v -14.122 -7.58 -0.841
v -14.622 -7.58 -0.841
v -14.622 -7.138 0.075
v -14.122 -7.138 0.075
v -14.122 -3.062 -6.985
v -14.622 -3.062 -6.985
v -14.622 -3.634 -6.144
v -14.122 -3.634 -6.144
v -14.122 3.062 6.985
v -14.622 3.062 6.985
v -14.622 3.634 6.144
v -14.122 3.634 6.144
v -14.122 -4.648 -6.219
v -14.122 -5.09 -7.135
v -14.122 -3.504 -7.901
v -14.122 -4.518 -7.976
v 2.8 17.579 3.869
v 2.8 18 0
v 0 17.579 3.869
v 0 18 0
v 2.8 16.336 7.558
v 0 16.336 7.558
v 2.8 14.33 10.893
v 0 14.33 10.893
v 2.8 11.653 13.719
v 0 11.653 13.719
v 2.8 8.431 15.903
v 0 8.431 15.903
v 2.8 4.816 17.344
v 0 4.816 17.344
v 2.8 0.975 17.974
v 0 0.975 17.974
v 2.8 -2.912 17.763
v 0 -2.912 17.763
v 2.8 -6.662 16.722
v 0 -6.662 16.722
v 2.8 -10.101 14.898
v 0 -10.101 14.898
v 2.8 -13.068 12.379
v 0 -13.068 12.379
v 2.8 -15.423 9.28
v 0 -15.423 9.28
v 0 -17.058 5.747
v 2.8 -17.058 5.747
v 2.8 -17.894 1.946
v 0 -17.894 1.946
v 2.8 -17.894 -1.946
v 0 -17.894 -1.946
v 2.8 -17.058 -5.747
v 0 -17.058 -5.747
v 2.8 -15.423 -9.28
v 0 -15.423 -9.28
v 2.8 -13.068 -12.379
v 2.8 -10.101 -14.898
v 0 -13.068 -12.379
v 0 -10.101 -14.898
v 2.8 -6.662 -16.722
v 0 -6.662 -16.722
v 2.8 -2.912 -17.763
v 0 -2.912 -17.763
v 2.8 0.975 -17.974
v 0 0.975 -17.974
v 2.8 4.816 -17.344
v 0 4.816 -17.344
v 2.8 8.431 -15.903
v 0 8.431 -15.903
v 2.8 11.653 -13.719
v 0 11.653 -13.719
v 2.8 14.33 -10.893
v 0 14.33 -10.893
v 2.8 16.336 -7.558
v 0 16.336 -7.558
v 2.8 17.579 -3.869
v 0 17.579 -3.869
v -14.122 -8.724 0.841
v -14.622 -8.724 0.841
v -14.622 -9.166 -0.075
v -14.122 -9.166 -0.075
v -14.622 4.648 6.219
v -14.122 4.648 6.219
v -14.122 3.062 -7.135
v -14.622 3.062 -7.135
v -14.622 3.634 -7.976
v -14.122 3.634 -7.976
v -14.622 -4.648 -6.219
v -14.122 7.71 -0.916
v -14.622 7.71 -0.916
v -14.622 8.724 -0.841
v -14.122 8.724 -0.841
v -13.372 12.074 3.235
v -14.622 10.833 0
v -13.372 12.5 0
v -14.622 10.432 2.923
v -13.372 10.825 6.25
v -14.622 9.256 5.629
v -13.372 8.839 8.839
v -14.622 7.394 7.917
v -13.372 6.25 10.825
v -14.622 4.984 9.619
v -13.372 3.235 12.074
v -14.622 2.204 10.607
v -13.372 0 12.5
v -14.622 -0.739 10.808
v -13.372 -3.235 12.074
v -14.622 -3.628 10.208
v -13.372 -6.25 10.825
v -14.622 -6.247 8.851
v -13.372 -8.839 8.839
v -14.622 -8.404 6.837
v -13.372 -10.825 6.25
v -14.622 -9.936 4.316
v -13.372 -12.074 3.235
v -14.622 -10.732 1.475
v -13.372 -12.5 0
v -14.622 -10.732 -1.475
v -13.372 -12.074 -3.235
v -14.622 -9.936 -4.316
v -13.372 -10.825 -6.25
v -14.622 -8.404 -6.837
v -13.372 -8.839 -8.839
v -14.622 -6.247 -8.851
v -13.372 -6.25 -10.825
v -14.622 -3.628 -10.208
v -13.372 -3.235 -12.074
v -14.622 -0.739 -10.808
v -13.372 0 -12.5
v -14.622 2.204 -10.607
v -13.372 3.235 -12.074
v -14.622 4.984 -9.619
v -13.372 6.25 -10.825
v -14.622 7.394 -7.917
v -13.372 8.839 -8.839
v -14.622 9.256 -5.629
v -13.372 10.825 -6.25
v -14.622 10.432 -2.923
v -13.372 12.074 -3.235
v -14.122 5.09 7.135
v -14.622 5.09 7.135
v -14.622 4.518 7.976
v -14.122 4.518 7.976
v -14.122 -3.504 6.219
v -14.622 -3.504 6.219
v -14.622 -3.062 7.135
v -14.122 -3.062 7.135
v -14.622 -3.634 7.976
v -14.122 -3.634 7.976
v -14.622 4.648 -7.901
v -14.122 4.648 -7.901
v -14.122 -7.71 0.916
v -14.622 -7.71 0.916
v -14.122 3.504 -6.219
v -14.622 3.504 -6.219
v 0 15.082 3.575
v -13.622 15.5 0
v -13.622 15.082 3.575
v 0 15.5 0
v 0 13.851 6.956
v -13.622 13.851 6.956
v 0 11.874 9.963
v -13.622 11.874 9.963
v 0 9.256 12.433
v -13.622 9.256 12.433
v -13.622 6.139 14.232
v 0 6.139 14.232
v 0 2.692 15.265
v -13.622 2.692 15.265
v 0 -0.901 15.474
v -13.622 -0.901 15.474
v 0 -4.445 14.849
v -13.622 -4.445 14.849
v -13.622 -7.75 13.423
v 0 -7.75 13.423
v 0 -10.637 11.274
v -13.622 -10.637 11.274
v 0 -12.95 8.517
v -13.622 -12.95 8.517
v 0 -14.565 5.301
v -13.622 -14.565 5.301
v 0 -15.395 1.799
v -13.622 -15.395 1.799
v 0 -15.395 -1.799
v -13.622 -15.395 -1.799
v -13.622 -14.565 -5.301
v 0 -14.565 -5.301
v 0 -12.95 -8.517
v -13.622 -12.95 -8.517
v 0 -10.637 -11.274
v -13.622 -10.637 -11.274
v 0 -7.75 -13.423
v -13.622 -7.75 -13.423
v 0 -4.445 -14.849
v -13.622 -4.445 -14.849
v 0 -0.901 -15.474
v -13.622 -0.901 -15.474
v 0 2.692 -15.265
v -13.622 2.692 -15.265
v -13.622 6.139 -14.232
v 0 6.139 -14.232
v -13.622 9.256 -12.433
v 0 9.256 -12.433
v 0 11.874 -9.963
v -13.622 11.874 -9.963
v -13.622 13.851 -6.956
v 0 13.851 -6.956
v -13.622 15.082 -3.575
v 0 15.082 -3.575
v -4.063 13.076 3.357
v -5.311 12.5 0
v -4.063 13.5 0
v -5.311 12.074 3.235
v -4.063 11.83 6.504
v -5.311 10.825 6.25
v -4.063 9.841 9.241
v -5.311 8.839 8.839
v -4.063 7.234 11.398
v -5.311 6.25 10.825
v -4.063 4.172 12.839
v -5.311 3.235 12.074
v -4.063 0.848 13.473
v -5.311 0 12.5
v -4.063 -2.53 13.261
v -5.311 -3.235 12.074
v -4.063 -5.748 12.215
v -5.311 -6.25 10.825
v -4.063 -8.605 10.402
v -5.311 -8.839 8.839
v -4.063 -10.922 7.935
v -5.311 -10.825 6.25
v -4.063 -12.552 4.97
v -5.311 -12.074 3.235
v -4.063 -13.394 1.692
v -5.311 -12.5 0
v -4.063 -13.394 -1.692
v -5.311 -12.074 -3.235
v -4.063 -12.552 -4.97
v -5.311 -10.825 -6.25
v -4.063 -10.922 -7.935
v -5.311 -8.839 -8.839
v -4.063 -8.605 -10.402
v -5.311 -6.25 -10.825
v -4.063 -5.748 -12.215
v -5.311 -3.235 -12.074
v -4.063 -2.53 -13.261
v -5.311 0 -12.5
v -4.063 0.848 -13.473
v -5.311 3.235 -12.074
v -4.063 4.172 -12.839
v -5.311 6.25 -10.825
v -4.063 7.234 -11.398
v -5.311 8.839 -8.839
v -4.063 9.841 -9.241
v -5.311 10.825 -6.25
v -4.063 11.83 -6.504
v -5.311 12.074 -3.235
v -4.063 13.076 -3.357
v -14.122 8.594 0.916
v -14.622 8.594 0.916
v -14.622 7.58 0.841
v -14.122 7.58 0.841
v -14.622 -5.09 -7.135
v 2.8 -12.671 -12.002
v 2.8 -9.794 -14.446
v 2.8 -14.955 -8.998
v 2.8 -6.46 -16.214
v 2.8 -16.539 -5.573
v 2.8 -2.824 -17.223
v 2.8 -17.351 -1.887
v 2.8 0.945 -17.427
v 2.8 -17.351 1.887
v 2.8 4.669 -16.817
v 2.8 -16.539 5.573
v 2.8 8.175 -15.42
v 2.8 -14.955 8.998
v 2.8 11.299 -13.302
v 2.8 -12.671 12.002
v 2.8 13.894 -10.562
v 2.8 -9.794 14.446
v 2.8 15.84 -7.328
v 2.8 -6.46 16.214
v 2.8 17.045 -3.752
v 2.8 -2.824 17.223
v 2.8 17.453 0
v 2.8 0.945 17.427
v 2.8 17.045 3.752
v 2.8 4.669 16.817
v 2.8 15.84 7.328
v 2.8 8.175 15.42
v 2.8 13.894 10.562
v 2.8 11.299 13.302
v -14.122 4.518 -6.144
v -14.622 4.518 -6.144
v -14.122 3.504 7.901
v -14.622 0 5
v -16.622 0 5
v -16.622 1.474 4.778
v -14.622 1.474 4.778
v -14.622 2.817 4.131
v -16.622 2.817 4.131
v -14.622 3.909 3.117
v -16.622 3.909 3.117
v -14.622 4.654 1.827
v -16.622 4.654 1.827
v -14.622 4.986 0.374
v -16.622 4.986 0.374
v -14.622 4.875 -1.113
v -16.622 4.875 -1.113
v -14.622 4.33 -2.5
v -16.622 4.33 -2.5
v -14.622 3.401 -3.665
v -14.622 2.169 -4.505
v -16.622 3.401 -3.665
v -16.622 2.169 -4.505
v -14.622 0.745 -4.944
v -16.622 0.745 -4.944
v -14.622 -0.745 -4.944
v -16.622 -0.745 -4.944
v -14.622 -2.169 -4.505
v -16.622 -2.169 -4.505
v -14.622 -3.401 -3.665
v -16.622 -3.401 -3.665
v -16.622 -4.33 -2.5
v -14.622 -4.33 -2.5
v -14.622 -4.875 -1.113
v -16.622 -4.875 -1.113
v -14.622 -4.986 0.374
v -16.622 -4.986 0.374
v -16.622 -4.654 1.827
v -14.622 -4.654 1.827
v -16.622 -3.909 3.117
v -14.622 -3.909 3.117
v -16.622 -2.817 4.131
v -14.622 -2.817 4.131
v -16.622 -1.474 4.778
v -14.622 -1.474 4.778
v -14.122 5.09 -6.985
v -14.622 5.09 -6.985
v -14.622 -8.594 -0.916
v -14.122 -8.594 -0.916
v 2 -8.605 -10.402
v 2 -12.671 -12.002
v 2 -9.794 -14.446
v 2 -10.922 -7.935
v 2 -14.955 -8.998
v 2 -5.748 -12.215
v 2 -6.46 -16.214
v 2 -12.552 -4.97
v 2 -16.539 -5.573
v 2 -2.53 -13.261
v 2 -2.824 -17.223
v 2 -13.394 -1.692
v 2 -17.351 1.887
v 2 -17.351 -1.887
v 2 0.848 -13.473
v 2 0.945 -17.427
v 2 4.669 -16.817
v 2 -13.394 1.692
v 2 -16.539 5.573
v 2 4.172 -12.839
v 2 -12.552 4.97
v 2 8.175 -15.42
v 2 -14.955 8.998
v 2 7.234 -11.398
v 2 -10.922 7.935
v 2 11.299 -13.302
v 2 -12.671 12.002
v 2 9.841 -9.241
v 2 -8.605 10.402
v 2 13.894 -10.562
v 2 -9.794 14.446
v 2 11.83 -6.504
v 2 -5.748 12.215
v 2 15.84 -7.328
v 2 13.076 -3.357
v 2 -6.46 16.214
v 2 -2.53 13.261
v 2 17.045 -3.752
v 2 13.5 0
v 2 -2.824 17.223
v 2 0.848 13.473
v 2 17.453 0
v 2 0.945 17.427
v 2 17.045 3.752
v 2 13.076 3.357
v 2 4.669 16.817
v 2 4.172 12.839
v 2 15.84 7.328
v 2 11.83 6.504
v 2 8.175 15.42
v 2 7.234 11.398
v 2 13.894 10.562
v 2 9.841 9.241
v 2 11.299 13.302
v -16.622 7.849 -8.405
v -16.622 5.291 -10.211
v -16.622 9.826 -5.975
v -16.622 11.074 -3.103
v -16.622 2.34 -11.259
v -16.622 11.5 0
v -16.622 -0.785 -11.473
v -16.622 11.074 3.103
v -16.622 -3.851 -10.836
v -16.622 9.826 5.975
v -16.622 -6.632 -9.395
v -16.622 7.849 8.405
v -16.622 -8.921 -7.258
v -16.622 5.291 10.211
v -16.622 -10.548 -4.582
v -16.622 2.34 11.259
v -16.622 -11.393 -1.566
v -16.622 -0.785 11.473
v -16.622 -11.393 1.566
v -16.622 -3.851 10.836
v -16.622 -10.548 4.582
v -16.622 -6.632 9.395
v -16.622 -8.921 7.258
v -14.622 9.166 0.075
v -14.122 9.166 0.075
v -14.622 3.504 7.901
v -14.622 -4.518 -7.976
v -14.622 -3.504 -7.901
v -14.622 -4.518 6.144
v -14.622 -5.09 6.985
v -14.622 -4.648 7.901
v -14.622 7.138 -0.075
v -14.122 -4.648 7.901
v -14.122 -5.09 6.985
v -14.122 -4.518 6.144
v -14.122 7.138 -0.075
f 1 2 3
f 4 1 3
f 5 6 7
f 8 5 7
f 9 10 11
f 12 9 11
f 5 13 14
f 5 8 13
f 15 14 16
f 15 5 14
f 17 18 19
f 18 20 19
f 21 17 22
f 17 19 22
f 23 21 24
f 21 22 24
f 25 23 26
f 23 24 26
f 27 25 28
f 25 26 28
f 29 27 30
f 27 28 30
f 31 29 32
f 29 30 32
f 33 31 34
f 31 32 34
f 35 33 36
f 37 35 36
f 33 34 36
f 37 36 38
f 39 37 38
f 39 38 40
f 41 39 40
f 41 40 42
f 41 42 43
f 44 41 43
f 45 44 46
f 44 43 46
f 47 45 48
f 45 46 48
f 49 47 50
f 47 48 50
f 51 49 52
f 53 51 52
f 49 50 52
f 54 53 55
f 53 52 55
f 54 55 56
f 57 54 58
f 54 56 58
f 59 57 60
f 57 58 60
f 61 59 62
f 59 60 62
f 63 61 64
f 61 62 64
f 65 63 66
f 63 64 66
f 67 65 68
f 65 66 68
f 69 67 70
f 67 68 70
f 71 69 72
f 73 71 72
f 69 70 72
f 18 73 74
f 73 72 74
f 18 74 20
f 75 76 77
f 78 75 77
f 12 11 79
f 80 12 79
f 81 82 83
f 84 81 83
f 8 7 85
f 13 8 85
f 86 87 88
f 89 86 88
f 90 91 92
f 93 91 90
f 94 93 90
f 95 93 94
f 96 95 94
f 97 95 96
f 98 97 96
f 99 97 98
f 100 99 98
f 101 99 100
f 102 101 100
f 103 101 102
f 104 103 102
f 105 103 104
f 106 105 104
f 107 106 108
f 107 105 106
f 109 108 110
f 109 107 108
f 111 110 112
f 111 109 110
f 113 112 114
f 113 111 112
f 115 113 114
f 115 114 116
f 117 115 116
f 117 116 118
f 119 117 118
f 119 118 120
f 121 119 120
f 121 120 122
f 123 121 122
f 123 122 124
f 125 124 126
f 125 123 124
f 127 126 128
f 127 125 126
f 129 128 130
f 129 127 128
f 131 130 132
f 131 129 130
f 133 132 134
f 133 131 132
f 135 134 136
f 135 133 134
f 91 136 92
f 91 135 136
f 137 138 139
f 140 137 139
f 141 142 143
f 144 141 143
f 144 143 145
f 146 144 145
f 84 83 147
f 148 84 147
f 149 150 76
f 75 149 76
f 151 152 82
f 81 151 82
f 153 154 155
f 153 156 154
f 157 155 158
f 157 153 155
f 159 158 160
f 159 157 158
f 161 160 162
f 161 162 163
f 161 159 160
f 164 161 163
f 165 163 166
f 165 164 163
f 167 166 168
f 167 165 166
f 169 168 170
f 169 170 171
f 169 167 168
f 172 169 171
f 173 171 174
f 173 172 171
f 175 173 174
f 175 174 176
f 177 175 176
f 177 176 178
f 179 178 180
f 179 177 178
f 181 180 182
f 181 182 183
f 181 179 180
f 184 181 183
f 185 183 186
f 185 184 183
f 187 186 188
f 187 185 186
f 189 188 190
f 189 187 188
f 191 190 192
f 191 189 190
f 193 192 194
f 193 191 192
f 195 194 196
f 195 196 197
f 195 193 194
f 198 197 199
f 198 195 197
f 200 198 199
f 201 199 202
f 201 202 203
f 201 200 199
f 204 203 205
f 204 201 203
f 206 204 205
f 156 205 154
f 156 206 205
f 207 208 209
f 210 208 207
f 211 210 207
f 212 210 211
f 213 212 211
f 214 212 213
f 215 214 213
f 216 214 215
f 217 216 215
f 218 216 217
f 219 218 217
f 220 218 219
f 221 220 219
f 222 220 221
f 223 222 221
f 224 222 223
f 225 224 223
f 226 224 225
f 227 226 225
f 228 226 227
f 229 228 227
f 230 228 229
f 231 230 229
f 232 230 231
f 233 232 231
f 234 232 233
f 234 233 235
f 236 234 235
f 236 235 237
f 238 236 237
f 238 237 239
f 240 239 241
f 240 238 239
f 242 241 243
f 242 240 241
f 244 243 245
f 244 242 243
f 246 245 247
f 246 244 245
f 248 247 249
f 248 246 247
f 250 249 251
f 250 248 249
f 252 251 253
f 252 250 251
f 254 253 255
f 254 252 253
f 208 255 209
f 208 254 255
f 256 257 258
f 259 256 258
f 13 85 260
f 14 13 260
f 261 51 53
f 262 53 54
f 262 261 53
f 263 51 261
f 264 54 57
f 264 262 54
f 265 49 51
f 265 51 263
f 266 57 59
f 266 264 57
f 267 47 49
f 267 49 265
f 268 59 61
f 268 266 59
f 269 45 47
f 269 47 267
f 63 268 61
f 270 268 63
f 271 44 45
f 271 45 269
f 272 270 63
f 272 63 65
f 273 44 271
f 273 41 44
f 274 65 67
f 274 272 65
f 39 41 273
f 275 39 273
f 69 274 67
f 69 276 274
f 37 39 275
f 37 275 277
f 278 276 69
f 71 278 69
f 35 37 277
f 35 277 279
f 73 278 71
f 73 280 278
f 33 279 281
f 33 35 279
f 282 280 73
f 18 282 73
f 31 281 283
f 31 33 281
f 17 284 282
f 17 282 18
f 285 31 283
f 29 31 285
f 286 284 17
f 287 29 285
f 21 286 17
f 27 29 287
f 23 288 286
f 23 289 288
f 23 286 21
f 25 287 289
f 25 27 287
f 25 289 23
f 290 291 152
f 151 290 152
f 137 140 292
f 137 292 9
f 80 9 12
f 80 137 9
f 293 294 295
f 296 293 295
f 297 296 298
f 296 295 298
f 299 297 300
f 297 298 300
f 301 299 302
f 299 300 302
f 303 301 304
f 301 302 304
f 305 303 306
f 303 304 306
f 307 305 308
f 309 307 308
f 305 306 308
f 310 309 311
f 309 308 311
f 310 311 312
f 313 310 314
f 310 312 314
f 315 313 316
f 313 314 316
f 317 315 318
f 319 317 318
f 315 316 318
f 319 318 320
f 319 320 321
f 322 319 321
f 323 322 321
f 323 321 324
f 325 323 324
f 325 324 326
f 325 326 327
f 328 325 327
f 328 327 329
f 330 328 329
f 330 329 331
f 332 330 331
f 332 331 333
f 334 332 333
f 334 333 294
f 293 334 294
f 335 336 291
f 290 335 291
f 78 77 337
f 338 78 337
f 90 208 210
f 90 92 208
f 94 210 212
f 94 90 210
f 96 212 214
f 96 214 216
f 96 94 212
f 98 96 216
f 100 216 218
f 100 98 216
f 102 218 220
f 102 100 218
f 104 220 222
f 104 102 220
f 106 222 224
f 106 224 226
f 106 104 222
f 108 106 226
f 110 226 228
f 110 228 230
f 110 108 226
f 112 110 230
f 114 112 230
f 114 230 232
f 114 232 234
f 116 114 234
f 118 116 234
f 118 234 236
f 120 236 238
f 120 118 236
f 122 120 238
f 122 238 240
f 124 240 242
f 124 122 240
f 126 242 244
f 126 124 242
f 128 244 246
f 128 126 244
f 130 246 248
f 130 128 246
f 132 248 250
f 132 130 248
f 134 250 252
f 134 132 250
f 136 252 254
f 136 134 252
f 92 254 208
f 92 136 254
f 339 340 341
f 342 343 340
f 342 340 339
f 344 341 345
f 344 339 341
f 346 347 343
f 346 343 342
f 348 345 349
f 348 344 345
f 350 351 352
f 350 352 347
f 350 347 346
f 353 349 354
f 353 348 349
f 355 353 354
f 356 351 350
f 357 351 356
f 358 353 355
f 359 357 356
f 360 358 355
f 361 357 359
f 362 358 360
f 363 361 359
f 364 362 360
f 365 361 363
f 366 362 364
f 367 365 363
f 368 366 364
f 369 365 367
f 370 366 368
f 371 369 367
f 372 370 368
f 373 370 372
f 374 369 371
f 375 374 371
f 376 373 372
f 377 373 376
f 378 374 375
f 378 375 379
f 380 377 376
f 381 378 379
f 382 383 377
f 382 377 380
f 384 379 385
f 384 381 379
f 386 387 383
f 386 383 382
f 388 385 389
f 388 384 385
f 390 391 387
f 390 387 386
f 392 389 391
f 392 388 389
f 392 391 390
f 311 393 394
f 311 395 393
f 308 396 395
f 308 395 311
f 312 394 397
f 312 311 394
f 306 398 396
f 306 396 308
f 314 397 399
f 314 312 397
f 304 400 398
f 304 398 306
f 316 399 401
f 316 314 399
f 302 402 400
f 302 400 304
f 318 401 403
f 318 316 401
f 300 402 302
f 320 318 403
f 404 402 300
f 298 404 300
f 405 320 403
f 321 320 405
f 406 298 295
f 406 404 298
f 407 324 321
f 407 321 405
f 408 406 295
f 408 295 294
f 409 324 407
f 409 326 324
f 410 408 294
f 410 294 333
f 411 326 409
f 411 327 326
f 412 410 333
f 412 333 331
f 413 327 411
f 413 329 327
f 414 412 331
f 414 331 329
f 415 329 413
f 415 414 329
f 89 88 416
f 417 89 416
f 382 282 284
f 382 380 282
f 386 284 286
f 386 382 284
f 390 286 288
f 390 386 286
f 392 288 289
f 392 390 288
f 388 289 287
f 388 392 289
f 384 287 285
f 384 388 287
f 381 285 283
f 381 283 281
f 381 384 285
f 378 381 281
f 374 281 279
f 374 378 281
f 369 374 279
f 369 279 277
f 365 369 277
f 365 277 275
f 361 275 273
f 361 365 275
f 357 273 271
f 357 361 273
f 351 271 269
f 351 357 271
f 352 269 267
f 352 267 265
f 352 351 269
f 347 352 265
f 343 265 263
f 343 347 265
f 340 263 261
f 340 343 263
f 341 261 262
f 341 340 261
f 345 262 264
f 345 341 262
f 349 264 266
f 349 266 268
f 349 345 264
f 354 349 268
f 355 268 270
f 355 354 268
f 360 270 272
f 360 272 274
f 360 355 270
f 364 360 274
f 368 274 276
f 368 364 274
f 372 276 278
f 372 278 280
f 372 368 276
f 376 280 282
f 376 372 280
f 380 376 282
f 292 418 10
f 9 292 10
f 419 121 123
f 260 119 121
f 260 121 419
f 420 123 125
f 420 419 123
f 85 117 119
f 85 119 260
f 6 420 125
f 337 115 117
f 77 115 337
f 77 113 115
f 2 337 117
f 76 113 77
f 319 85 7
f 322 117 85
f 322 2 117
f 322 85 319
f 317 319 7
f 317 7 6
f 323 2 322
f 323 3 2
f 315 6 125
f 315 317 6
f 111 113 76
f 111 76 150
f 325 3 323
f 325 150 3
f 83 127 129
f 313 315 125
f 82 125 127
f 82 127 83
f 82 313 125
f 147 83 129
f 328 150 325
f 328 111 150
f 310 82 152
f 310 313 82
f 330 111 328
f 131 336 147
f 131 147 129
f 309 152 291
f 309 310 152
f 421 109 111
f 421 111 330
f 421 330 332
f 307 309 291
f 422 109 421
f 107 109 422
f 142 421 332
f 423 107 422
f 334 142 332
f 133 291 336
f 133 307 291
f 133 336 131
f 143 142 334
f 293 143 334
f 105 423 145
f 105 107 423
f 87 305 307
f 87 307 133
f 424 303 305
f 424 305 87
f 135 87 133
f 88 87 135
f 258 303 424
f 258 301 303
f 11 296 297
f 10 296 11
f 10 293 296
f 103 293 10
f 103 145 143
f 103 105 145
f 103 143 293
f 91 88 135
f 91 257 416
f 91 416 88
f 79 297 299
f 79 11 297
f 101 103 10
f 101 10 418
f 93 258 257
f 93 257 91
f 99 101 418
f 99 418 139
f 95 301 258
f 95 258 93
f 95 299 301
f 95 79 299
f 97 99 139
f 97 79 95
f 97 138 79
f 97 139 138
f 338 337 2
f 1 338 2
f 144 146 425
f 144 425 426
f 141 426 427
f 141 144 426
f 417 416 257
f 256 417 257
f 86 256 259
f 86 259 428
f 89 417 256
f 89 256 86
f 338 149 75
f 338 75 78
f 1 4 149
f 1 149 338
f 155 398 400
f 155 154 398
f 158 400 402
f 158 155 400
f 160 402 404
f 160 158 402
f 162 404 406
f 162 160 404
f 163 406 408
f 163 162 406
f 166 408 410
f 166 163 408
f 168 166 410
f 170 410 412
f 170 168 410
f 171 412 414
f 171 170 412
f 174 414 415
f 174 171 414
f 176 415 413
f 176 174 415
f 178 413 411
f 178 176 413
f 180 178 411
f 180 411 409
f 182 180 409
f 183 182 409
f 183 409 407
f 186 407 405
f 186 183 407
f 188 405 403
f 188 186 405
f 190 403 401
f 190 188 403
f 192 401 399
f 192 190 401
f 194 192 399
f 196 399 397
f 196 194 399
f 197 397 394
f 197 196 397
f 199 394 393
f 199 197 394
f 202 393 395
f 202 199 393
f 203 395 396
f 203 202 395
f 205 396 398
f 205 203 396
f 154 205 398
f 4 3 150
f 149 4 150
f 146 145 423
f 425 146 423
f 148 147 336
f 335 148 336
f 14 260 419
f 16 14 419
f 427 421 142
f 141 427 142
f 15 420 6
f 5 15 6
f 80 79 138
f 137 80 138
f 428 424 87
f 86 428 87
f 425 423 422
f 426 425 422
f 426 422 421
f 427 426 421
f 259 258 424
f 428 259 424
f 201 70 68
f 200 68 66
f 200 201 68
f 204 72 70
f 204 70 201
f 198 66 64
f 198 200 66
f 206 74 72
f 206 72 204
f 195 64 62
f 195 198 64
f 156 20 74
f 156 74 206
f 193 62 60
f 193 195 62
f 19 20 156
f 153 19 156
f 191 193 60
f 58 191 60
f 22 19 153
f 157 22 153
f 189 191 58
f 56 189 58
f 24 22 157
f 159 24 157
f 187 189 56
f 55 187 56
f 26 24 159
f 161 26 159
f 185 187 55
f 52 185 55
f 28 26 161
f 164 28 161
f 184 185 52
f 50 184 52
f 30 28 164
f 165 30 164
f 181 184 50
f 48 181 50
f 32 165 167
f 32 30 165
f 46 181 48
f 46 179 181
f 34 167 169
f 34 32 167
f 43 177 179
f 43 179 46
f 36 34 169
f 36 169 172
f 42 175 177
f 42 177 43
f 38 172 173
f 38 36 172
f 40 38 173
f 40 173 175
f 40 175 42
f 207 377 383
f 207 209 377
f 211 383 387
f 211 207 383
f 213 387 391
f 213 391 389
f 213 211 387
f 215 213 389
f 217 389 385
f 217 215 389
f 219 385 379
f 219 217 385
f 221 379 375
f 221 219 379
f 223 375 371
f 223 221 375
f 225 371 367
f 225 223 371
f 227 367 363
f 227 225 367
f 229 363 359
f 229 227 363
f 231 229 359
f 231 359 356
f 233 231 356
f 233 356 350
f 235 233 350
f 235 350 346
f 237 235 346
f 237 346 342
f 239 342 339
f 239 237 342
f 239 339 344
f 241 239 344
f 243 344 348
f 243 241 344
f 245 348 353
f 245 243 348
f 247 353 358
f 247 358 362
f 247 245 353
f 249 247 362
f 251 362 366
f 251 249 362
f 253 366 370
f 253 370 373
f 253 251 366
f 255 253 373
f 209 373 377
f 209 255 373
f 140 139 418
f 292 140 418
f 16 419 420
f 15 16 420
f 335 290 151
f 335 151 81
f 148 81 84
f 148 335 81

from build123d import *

# Parameters (mm, degrees)
SKETCH2_R           = 5
CUT_EXTRUDE1_DEPTH  = 10
BOSS_EXTRUDE1_DEPTH = 0.5


with BuildPart() as part:
    # Sketch1 → Revolve1 (revolve)
    with BuildSketch(Plane.XY):
        Polygon((-13.622037679, 15.5), (0, 15.5), (0, 18), (2, 18), (2.8, 18), (2.8, 17.453091715), (2, 17.453091715), (2, 13.5), (-4.063478188, 13.5), (-5.311018839, 12.5), (-13.372037679, 12.5), (-14.622037679, 10.833333333), (-14.622037679, 0), (-16.622037679, 0), (-16.622037679, 11.5), align=None)
    revolve(axis=Axis((-25, 0, 0), (1, 0, 0)))

    # Sketch2 → Cut-Extrude1 (cut)
    with BuildSketch(Plane.ZY.offset(16.622037679)):
        Circle(SKETCH2_R)
    extrude(amount=-CUT_EXTRUDE1_DEPTH, mode=Mode.SUBTRACT)

    # Sketch3 → Boss-Extrude1 (add)
    with BuildSketch(Plane(origin=(-14.622037679, 0, 0), x_dir=(0, 0, -1), z_dir=(1, 0, 0))):
        Polygon((7.134838542, 3.062100229), (7.975608442, 3.633882224), (7.900815659, 4.647901314), (6.985252976, 5.090138409), (6.144483075, 4.518356414), (6.219275858, 3.504337324), align=None)
        Polygon((0.915562683, 7.710001544), (0.8407699, 8.724020633), (-0.074792783, 9.166257728), (-0.915562683, 8.594475733), (-0.8407699, 7.580456643), (0.074792783, 7.138219548), align=None)
        Polygon((6.219275858, -4.647901314), (7.134838542, -5.090138409), (7.975608442, -4.518356414), (7.900815659, -3.504337324), (6.985252976, -3.062100229), (6.144483075, -3.633882224), align=None)
        Polygon((-0.915562683, -7.710001544), (-0.8407699, -8.724020633), (0.074792783, -9.166257728), (0.915562683, -8.594475733), (0.8407699, -7.580456643), (-0.074792783, -7.138219548), align=None)
        Polygon((-7.134838542, -3.062100229), (-7.975608442, -3.633882224), (-7.900815659, -4.647901314), (-6.985252976, -5.090138409), (-6.144483075, -4.518356414), (-6.219275858, -3.504337324), align=None)
        Polygon((-6.219275858, 4.647901314), (-7.134838542, 5.090138409), (-7.975608442, 4.518356414), (-7.900815659, 3.504337324), (-6.985252976, 3.062100229), (-6.144483075, 3.633882224), align=None)
    extrude(amount=BOSS_EXTRUDE1_DEPTH)


solid = part.part
